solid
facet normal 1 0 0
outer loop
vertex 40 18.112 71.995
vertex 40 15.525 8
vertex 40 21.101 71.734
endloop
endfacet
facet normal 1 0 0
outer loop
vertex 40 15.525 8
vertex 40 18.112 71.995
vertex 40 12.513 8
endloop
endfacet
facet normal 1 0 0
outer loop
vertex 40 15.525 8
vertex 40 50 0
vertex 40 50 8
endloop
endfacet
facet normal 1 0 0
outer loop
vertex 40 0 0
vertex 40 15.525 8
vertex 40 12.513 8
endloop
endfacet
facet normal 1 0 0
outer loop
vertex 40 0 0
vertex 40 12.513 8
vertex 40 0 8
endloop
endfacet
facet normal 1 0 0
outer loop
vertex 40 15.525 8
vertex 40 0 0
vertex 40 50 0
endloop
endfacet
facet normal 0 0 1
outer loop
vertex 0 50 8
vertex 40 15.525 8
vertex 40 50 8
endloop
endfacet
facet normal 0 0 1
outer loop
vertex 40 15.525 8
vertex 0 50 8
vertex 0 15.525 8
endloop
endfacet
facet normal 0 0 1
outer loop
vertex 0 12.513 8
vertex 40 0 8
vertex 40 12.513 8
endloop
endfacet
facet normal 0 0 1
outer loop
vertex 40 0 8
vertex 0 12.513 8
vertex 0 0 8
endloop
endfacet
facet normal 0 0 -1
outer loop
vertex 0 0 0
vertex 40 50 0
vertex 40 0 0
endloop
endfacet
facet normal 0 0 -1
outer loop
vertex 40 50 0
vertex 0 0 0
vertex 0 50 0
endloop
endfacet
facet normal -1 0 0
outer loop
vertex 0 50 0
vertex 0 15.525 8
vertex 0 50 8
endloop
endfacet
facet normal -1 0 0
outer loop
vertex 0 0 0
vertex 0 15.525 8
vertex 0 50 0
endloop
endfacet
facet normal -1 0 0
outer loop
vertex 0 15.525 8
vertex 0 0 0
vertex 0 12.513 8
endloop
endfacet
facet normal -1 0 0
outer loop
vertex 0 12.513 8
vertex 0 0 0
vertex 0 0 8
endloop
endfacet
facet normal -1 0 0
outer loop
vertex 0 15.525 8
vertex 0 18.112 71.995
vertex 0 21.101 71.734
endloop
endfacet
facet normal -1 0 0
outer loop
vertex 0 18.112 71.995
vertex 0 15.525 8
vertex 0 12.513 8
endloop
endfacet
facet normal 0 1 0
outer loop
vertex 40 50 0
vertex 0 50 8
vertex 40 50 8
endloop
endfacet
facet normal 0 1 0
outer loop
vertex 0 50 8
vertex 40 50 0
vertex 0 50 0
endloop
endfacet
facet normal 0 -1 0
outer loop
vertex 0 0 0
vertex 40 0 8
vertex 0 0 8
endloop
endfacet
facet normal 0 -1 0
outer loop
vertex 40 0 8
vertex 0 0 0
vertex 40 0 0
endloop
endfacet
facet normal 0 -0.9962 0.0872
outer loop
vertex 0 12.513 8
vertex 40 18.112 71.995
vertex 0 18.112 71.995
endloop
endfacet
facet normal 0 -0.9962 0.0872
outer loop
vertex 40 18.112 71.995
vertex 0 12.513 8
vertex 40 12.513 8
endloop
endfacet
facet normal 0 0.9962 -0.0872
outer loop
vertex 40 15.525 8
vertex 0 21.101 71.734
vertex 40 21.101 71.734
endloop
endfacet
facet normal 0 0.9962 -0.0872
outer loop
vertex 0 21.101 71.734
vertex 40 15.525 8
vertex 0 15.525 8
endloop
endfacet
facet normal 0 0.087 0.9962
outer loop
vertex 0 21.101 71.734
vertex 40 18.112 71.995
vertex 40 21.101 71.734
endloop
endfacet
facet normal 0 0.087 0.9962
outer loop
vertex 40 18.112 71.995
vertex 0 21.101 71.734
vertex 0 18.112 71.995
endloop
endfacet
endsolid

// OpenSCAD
$fn = 60;

W = 40;
D = 50;
d = 70;
H = 8;
h = 3;

// base plate
color("white", alpha=.3) cube([W, D, H]);
color("white", alpha=.3) translate([0, 15, 2]) rotate([85, 0, 0]) cube([W, d, h]);
